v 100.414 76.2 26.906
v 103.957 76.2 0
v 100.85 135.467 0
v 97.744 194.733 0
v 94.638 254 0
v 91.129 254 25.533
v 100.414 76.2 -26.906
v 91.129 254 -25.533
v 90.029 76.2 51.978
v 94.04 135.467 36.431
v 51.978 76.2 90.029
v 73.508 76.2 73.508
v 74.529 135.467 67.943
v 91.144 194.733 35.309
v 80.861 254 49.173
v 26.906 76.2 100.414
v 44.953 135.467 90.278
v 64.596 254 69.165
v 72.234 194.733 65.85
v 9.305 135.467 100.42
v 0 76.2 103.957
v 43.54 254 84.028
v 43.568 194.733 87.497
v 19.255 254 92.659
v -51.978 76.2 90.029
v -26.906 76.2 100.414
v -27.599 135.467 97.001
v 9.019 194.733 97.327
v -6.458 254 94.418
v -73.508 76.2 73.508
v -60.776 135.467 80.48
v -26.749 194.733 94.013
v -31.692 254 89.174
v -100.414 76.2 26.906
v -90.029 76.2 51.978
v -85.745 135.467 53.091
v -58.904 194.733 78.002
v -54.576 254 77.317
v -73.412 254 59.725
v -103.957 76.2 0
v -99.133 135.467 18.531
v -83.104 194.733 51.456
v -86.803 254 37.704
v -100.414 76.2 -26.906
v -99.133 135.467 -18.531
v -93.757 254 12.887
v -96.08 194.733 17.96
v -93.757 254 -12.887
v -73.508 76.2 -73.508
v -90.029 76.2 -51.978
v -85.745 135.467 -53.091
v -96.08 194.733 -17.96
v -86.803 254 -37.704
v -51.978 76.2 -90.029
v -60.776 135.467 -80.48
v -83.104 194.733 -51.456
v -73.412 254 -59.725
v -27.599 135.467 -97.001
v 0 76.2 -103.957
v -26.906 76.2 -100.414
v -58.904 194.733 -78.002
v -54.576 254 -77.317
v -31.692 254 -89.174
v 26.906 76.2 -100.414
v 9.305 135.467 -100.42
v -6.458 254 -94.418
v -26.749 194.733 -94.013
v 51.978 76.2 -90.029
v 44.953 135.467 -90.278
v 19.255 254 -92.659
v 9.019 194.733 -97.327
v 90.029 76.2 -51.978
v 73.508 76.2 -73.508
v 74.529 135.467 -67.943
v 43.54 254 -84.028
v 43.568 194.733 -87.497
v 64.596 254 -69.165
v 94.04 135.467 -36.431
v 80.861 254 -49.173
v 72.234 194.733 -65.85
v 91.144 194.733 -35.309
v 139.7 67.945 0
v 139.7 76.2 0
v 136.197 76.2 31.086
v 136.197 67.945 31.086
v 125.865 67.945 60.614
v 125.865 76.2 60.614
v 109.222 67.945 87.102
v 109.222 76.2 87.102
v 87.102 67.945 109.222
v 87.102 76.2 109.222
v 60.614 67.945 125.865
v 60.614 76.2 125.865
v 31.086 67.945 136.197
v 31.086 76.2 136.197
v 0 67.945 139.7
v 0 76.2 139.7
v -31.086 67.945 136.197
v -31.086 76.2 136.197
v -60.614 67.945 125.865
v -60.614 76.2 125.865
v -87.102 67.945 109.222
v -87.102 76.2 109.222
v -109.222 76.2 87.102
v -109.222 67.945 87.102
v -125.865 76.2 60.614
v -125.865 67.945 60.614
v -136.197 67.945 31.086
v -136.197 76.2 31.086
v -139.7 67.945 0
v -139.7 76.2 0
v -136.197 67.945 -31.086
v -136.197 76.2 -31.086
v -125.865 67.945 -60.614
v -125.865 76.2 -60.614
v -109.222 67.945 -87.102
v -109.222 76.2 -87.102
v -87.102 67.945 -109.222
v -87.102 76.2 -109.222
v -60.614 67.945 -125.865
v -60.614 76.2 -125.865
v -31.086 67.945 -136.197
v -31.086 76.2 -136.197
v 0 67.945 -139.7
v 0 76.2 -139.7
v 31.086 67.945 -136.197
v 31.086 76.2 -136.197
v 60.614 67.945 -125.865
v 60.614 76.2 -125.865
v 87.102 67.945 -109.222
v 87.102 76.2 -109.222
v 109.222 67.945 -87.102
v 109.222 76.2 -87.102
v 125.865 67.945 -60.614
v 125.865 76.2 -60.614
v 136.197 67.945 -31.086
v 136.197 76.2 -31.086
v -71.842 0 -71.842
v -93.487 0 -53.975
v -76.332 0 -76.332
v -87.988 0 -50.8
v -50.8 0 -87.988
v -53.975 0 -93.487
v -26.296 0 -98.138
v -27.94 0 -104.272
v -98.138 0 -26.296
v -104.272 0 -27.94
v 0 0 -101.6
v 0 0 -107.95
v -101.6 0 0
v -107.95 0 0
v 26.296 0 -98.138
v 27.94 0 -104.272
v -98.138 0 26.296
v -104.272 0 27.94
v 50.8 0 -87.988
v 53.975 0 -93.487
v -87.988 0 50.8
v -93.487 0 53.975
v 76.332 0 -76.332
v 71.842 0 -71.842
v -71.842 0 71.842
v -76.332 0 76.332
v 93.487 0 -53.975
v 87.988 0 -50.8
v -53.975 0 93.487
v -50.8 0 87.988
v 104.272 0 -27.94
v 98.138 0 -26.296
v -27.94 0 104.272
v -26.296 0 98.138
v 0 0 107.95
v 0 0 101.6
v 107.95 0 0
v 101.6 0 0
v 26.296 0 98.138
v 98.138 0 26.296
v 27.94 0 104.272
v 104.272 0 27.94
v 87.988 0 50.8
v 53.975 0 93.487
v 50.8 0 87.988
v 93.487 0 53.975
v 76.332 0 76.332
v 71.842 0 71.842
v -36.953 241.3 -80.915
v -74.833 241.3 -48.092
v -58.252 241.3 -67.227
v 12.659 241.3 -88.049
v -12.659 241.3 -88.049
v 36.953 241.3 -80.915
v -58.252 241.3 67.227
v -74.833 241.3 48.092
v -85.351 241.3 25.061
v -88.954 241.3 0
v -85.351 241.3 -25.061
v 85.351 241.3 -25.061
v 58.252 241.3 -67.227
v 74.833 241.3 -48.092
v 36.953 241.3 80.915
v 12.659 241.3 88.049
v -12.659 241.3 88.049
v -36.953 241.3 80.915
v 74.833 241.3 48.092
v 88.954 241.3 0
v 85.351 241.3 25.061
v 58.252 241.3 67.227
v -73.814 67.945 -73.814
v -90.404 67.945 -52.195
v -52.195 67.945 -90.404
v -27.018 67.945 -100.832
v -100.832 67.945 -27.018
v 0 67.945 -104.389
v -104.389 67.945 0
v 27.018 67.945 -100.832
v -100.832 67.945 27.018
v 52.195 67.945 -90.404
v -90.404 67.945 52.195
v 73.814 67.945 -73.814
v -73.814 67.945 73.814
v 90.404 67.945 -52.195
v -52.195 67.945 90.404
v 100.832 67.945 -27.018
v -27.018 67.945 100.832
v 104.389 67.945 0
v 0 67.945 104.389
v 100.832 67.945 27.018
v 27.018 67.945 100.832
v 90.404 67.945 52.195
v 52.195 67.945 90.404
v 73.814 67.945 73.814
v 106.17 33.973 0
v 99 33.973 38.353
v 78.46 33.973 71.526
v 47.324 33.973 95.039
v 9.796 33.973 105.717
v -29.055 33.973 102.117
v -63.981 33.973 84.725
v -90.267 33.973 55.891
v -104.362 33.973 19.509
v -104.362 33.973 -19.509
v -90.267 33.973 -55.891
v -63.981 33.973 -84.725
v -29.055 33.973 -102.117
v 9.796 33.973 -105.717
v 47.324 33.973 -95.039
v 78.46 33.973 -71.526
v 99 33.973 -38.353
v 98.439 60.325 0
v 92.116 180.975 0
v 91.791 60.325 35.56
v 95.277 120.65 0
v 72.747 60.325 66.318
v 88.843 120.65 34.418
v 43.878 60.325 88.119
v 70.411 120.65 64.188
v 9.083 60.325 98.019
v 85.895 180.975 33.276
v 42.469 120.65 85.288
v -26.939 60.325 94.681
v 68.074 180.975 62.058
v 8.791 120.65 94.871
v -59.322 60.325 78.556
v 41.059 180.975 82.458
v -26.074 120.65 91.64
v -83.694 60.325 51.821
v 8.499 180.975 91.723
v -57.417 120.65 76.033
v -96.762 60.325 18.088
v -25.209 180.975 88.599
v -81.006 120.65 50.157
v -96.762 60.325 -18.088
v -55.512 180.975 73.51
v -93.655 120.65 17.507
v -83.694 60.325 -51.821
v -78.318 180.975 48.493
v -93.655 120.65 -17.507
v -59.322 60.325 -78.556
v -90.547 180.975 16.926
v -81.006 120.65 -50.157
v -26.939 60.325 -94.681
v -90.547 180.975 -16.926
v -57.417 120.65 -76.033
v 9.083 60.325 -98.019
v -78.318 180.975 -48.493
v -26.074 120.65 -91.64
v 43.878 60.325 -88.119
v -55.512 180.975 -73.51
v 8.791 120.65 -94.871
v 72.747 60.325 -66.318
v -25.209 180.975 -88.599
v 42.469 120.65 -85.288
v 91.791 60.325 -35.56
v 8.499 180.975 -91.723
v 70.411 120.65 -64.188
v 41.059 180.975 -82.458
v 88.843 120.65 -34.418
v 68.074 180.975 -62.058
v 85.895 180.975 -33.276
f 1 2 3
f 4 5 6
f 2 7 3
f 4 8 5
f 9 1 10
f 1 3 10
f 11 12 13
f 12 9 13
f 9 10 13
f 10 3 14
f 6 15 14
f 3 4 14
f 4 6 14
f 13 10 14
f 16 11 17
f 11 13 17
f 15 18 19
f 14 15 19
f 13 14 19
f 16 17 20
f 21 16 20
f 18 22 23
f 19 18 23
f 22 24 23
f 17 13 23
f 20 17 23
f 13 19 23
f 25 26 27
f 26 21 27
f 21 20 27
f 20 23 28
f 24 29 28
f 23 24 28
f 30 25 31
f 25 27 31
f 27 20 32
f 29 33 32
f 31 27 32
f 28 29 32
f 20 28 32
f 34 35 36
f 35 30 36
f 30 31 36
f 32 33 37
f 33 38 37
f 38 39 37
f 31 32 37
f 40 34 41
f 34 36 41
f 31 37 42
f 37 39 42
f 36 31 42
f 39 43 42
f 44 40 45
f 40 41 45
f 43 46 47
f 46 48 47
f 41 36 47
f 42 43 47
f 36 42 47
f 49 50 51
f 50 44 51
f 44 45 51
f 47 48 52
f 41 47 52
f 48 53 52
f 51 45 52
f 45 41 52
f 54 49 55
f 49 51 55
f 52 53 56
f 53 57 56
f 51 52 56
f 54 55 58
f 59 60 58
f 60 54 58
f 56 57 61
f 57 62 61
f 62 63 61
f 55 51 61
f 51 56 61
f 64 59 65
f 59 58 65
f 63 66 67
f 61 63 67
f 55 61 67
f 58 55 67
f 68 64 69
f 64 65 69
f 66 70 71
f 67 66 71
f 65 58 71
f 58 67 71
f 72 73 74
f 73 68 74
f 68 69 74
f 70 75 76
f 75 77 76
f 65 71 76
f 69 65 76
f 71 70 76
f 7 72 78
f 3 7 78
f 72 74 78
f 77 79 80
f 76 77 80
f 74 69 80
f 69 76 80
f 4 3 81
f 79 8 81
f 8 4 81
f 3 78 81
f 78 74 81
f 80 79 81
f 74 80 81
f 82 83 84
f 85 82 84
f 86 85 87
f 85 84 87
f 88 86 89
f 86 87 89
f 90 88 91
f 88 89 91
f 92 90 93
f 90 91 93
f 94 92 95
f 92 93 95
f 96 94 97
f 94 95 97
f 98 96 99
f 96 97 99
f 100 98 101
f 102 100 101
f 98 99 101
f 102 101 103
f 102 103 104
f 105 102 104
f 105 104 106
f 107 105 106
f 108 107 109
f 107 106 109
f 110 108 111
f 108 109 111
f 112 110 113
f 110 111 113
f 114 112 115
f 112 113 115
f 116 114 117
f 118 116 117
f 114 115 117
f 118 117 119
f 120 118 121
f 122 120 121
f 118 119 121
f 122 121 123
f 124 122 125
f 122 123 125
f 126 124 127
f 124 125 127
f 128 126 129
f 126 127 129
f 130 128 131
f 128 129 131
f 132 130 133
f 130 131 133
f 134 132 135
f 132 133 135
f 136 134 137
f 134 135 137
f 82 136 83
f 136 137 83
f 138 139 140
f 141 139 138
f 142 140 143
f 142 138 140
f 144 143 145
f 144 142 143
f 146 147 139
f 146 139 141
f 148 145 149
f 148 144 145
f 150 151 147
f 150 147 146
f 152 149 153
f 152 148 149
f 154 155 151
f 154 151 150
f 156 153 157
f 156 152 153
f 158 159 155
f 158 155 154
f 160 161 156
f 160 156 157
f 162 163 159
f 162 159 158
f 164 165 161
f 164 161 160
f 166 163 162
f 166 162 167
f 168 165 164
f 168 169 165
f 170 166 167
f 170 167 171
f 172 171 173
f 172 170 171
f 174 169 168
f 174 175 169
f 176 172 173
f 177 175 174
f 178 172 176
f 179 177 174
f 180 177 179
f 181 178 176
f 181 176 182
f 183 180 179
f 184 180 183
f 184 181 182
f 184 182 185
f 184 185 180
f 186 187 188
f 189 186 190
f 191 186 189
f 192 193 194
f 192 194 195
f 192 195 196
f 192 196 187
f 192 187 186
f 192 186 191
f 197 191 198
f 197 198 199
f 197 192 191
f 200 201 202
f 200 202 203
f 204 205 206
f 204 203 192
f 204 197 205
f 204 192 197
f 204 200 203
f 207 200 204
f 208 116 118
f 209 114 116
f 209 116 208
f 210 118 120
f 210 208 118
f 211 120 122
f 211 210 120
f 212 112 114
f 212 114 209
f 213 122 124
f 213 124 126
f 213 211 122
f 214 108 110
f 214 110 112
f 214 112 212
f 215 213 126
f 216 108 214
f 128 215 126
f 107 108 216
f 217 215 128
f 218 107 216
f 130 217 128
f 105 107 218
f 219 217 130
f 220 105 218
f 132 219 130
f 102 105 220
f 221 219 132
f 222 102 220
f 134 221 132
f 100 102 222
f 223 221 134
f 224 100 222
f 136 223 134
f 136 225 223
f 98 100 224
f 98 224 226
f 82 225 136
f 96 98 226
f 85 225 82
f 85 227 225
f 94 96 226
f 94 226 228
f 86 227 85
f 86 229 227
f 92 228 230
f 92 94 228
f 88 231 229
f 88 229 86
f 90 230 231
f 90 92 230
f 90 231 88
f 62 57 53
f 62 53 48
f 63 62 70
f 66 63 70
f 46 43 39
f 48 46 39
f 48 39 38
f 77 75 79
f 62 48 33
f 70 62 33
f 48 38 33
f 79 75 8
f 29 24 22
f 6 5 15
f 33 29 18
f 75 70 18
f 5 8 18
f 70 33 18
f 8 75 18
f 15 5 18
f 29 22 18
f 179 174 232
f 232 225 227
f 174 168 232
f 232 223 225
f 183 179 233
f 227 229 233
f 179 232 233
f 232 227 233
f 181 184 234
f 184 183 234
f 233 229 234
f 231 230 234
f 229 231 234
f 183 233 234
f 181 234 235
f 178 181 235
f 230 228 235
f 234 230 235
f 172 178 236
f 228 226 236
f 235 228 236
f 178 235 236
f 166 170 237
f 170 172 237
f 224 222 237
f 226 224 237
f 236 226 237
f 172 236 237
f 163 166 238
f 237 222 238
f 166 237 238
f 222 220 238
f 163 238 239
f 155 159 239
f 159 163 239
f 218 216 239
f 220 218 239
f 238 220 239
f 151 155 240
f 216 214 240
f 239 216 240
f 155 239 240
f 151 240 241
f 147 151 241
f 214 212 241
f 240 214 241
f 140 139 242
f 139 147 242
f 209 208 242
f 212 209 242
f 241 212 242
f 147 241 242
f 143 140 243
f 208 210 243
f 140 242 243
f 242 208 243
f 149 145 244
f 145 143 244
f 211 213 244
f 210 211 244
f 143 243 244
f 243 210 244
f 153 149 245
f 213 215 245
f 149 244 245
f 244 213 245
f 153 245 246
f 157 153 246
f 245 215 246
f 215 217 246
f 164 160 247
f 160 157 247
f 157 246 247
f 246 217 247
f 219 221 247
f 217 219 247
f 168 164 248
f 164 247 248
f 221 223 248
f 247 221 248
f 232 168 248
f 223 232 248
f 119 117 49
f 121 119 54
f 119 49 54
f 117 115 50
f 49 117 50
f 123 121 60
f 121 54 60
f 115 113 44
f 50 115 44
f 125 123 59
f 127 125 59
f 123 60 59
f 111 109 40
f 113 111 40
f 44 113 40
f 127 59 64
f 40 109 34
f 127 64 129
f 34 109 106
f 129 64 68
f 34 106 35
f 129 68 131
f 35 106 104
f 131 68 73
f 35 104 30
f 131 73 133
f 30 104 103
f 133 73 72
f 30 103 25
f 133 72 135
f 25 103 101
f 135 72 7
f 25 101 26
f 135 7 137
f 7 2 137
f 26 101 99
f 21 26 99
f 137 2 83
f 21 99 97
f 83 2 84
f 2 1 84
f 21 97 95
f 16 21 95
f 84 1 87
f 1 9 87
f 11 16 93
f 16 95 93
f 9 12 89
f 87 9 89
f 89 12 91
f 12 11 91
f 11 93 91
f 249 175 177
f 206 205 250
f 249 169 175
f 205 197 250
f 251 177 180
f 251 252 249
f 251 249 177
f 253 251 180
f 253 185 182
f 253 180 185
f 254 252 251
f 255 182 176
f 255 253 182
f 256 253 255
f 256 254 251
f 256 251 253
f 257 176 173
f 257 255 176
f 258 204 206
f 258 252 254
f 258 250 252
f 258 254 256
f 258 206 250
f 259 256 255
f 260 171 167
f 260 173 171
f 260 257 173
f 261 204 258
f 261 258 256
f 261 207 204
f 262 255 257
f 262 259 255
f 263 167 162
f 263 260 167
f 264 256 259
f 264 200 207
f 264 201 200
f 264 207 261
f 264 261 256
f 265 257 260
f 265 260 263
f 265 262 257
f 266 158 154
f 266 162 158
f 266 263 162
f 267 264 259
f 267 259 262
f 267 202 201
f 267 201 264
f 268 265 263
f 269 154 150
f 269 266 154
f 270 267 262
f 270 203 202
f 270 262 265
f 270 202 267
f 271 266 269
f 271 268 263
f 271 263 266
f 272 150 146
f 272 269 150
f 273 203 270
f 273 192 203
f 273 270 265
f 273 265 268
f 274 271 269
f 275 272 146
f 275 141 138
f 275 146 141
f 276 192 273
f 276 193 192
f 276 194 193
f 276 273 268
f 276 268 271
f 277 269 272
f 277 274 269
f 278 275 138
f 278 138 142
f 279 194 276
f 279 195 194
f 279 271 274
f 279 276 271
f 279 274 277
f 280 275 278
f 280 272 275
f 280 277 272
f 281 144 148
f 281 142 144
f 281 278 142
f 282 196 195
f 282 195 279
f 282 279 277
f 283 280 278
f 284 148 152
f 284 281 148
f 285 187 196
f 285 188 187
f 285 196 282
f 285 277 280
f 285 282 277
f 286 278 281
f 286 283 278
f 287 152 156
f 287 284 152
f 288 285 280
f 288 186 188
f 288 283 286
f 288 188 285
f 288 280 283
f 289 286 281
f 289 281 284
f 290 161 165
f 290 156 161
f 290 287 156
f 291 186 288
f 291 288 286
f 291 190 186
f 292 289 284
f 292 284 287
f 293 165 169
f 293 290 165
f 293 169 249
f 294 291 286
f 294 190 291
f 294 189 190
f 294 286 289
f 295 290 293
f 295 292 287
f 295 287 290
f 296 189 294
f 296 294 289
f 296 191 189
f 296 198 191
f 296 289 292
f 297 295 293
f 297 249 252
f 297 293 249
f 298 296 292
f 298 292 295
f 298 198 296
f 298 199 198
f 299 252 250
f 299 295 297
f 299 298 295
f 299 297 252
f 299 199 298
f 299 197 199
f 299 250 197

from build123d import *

# Parameters (mm, degrees)
F0_R     = 107.95
F1_DEPTH = 254
F1_TAPER = 3
F2_R     = 101.6
F3_DEPTH = 241.3
F3_TAPER = 3
F6_R     = 139.7
F6_R_2   = 103.9495
F7_DEPTH = 8.255


with BuildPart() as f1:
    # F0 (on Front) → F1 (new body)
    with BuildSketch(Plane.XZ):
        Circle(F0_R)
    extrude(amount=-F1_DEPTH, taper=F1_TAPER)

    # F2 (on face) → F3 (cut)
    with BuildSketch(Plane.XZ):
        Circle(F2_R)
    extrude(amount=-F3_DEPTH, taper=F3_TAPER, mode=Mode.SUBTRACT)

    # F6 (on offset) → F7 (join)
    with BuildSketch(Plane.XZ.offset(-76.2)):
        Circle(F6_R)
        Circle(F6_R_2, mode=Mode.SUBTRACT)
    extrude(amount=F7_DEPTH)


solid = f1.part
